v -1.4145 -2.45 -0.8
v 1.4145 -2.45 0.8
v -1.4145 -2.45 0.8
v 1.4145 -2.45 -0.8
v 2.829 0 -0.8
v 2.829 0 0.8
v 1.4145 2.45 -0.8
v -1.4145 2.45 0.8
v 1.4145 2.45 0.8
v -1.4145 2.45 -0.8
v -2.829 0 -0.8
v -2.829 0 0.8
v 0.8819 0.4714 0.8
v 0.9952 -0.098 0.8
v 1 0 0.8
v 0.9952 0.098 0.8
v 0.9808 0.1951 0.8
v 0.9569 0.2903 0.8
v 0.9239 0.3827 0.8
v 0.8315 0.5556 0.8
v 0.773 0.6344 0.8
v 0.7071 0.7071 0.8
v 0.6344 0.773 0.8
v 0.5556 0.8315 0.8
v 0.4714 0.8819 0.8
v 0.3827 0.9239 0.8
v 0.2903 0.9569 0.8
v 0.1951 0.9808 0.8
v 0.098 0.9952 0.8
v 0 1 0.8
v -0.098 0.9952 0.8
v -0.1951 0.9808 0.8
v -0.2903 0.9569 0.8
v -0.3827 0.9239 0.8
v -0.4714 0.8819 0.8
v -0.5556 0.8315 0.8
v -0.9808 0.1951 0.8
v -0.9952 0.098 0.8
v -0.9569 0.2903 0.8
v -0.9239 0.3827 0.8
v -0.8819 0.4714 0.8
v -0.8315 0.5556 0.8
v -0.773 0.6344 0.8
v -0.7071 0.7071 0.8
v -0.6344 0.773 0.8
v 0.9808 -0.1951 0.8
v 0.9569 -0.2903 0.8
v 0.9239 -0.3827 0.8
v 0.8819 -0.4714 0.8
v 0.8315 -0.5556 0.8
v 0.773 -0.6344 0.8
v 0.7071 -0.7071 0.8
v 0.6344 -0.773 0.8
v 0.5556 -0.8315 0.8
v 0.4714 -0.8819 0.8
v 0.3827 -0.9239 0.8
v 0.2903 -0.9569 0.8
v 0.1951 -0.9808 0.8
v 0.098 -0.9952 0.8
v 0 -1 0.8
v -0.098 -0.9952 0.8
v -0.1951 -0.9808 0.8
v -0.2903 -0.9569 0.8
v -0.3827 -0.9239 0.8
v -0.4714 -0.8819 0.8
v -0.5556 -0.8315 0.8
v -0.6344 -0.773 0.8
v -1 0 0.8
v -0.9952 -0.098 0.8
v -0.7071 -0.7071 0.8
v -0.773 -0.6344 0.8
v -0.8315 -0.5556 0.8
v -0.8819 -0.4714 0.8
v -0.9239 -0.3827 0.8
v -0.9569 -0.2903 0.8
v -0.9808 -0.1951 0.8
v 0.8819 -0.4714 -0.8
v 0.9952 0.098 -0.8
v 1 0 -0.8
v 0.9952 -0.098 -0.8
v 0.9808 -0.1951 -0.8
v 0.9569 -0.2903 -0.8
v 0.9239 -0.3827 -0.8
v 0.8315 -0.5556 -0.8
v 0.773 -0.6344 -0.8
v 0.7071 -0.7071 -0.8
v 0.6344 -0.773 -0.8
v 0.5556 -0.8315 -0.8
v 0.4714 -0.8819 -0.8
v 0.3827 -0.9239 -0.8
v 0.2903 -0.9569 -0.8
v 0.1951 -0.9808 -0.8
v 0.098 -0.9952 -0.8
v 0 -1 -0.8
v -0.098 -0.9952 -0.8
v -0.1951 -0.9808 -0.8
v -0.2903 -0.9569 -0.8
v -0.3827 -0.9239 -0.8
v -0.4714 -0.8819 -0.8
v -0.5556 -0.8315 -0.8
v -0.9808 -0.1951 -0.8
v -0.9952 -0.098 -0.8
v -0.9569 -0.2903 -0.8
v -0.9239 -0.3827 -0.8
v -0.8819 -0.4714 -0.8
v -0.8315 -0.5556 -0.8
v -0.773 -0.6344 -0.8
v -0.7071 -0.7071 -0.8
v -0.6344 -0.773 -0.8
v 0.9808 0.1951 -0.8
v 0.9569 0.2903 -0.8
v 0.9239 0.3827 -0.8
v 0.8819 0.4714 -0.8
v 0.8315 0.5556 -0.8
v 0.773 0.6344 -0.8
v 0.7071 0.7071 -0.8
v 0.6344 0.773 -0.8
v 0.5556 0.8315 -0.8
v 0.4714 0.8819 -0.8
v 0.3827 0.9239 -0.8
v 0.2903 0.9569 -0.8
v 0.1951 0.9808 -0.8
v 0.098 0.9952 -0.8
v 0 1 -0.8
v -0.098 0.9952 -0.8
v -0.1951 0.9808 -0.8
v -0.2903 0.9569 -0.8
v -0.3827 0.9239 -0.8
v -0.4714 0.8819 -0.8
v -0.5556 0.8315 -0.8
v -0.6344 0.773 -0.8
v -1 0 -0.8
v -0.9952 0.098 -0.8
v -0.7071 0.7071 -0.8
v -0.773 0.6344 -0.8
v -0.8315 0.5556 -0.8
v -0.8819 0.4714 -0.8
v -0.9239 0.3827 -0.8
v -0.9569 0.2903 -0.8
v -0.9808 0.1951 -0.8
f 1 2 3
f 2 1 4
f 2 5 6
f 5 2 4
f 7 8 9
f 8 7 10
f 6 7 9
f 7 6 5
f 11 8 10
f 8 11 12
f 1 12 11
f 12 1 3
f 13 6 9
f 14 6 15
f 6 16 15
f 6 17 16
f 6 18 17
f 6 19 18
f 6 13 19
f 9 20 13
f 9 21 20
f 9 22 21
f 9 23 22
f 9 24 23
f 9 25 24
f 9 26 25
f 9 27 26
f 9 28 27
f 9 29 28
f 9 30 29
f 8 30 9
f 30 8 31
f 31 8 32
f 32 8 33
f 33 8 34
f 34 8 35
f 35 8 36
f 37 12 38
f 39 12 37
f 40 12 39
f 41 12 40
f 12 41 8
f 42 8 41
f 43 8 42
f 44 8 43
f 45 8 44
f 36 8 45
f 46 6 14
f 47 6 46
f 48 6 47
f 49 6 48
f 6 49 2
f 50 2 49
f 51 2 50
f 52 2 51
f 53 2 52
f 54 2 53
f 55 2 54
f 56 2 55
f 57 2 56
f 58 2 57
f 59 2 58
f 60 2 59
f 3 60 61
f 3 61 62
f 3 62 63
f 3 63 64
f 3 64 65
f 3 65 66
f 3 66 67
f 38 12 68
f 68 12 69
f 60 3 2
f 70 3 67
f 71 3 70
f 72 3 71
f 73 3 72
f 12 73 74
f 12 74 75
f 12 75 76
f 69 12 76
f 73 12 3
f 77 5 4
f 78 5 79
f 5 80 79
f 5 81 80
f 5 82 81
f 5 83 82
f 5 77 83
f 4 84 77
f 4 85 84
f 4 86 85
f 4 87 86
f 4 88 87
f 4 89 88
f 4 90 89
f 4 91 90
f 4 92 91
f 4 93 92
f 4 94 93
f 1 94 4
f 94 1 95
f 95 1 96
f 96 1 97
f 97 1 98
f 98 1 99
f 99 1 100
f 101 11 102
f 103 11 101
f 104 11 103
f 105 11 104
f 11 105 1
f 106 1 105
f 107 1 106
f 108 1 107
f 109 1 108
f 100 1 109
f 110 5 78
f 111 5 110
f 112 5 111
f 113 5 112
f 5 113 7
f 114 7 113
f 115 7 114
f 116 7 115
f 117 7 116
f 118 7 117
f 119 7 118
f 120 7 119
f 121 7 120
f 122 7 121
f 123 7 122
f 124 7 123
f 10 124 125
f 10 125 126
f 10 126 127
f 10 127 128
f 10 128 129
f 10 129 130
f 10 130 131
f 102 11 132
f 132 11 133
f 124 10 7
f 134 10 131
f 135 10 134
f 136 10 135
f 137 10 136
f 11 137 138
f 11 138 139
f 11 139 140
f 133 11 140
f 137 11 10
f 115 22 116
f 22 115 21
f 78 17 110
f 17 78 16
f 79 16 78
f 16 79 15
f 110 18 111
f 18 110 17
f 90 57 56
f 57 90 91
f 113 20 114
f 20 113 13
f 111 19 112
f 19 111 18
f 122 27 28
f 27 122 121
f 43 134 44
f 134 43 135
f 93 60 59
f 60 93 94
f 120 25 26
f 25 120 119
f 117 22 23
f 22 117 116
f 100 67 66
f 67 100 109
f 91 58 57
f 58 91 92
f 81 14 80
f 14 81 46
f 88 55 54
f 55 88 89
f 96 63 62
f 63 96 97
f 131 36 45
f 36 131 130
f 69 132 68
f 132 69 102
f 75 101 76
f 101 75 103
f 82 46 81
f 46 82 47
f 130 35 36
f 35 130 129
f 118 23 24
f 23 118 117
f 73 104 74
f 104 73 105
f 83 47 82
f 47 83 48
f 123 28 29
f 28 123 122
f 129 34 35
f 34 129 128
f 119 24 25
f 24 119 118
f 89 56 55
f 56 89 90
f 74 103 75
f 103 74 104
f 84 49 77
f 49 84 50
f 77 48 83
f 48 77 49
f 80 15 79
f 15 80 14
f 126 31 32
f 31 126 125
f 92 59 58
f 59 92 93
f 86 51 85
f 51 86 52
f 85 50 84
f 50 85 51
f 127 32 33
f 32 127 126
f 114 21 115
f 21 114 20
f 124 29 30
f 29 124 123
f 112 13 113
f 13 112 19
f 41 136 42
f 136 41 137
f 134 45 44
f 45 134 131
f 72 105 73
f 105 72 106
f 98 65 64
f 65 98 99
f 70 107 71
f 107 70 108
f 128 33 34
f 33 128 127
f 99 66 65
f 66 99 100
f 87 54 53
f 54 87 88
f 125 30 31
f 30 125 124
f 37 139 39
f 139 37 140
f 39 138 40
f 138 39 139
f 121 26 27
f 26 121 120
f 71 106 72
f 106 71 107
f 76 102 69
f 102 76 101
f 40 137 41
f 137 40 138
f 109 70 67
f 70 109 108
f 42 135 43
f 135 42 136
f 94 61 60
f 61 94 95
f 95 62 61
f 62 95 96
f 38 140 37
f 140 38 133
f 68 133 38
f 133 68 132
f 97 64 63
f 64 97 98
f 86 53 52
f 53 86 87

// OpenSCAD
$fn=64;

nut_thickness = 1.6;
across_flats = 4.9;
hole_d = 2.0;

module hex_prism(af, h){
    r = af / sqrt(3); // circumradius for given across-flats
    cylinder(h=h, r=r, center=true, $fn=6);
}

module nut(af, h, hole_d){
    difference(){
        hex_prism(af, h);
        cylinder(h=h+0.4, d=hole_d, center=true, $fn=64);
    }
}

nut(across_flats, nut_thickness, hole_d);
